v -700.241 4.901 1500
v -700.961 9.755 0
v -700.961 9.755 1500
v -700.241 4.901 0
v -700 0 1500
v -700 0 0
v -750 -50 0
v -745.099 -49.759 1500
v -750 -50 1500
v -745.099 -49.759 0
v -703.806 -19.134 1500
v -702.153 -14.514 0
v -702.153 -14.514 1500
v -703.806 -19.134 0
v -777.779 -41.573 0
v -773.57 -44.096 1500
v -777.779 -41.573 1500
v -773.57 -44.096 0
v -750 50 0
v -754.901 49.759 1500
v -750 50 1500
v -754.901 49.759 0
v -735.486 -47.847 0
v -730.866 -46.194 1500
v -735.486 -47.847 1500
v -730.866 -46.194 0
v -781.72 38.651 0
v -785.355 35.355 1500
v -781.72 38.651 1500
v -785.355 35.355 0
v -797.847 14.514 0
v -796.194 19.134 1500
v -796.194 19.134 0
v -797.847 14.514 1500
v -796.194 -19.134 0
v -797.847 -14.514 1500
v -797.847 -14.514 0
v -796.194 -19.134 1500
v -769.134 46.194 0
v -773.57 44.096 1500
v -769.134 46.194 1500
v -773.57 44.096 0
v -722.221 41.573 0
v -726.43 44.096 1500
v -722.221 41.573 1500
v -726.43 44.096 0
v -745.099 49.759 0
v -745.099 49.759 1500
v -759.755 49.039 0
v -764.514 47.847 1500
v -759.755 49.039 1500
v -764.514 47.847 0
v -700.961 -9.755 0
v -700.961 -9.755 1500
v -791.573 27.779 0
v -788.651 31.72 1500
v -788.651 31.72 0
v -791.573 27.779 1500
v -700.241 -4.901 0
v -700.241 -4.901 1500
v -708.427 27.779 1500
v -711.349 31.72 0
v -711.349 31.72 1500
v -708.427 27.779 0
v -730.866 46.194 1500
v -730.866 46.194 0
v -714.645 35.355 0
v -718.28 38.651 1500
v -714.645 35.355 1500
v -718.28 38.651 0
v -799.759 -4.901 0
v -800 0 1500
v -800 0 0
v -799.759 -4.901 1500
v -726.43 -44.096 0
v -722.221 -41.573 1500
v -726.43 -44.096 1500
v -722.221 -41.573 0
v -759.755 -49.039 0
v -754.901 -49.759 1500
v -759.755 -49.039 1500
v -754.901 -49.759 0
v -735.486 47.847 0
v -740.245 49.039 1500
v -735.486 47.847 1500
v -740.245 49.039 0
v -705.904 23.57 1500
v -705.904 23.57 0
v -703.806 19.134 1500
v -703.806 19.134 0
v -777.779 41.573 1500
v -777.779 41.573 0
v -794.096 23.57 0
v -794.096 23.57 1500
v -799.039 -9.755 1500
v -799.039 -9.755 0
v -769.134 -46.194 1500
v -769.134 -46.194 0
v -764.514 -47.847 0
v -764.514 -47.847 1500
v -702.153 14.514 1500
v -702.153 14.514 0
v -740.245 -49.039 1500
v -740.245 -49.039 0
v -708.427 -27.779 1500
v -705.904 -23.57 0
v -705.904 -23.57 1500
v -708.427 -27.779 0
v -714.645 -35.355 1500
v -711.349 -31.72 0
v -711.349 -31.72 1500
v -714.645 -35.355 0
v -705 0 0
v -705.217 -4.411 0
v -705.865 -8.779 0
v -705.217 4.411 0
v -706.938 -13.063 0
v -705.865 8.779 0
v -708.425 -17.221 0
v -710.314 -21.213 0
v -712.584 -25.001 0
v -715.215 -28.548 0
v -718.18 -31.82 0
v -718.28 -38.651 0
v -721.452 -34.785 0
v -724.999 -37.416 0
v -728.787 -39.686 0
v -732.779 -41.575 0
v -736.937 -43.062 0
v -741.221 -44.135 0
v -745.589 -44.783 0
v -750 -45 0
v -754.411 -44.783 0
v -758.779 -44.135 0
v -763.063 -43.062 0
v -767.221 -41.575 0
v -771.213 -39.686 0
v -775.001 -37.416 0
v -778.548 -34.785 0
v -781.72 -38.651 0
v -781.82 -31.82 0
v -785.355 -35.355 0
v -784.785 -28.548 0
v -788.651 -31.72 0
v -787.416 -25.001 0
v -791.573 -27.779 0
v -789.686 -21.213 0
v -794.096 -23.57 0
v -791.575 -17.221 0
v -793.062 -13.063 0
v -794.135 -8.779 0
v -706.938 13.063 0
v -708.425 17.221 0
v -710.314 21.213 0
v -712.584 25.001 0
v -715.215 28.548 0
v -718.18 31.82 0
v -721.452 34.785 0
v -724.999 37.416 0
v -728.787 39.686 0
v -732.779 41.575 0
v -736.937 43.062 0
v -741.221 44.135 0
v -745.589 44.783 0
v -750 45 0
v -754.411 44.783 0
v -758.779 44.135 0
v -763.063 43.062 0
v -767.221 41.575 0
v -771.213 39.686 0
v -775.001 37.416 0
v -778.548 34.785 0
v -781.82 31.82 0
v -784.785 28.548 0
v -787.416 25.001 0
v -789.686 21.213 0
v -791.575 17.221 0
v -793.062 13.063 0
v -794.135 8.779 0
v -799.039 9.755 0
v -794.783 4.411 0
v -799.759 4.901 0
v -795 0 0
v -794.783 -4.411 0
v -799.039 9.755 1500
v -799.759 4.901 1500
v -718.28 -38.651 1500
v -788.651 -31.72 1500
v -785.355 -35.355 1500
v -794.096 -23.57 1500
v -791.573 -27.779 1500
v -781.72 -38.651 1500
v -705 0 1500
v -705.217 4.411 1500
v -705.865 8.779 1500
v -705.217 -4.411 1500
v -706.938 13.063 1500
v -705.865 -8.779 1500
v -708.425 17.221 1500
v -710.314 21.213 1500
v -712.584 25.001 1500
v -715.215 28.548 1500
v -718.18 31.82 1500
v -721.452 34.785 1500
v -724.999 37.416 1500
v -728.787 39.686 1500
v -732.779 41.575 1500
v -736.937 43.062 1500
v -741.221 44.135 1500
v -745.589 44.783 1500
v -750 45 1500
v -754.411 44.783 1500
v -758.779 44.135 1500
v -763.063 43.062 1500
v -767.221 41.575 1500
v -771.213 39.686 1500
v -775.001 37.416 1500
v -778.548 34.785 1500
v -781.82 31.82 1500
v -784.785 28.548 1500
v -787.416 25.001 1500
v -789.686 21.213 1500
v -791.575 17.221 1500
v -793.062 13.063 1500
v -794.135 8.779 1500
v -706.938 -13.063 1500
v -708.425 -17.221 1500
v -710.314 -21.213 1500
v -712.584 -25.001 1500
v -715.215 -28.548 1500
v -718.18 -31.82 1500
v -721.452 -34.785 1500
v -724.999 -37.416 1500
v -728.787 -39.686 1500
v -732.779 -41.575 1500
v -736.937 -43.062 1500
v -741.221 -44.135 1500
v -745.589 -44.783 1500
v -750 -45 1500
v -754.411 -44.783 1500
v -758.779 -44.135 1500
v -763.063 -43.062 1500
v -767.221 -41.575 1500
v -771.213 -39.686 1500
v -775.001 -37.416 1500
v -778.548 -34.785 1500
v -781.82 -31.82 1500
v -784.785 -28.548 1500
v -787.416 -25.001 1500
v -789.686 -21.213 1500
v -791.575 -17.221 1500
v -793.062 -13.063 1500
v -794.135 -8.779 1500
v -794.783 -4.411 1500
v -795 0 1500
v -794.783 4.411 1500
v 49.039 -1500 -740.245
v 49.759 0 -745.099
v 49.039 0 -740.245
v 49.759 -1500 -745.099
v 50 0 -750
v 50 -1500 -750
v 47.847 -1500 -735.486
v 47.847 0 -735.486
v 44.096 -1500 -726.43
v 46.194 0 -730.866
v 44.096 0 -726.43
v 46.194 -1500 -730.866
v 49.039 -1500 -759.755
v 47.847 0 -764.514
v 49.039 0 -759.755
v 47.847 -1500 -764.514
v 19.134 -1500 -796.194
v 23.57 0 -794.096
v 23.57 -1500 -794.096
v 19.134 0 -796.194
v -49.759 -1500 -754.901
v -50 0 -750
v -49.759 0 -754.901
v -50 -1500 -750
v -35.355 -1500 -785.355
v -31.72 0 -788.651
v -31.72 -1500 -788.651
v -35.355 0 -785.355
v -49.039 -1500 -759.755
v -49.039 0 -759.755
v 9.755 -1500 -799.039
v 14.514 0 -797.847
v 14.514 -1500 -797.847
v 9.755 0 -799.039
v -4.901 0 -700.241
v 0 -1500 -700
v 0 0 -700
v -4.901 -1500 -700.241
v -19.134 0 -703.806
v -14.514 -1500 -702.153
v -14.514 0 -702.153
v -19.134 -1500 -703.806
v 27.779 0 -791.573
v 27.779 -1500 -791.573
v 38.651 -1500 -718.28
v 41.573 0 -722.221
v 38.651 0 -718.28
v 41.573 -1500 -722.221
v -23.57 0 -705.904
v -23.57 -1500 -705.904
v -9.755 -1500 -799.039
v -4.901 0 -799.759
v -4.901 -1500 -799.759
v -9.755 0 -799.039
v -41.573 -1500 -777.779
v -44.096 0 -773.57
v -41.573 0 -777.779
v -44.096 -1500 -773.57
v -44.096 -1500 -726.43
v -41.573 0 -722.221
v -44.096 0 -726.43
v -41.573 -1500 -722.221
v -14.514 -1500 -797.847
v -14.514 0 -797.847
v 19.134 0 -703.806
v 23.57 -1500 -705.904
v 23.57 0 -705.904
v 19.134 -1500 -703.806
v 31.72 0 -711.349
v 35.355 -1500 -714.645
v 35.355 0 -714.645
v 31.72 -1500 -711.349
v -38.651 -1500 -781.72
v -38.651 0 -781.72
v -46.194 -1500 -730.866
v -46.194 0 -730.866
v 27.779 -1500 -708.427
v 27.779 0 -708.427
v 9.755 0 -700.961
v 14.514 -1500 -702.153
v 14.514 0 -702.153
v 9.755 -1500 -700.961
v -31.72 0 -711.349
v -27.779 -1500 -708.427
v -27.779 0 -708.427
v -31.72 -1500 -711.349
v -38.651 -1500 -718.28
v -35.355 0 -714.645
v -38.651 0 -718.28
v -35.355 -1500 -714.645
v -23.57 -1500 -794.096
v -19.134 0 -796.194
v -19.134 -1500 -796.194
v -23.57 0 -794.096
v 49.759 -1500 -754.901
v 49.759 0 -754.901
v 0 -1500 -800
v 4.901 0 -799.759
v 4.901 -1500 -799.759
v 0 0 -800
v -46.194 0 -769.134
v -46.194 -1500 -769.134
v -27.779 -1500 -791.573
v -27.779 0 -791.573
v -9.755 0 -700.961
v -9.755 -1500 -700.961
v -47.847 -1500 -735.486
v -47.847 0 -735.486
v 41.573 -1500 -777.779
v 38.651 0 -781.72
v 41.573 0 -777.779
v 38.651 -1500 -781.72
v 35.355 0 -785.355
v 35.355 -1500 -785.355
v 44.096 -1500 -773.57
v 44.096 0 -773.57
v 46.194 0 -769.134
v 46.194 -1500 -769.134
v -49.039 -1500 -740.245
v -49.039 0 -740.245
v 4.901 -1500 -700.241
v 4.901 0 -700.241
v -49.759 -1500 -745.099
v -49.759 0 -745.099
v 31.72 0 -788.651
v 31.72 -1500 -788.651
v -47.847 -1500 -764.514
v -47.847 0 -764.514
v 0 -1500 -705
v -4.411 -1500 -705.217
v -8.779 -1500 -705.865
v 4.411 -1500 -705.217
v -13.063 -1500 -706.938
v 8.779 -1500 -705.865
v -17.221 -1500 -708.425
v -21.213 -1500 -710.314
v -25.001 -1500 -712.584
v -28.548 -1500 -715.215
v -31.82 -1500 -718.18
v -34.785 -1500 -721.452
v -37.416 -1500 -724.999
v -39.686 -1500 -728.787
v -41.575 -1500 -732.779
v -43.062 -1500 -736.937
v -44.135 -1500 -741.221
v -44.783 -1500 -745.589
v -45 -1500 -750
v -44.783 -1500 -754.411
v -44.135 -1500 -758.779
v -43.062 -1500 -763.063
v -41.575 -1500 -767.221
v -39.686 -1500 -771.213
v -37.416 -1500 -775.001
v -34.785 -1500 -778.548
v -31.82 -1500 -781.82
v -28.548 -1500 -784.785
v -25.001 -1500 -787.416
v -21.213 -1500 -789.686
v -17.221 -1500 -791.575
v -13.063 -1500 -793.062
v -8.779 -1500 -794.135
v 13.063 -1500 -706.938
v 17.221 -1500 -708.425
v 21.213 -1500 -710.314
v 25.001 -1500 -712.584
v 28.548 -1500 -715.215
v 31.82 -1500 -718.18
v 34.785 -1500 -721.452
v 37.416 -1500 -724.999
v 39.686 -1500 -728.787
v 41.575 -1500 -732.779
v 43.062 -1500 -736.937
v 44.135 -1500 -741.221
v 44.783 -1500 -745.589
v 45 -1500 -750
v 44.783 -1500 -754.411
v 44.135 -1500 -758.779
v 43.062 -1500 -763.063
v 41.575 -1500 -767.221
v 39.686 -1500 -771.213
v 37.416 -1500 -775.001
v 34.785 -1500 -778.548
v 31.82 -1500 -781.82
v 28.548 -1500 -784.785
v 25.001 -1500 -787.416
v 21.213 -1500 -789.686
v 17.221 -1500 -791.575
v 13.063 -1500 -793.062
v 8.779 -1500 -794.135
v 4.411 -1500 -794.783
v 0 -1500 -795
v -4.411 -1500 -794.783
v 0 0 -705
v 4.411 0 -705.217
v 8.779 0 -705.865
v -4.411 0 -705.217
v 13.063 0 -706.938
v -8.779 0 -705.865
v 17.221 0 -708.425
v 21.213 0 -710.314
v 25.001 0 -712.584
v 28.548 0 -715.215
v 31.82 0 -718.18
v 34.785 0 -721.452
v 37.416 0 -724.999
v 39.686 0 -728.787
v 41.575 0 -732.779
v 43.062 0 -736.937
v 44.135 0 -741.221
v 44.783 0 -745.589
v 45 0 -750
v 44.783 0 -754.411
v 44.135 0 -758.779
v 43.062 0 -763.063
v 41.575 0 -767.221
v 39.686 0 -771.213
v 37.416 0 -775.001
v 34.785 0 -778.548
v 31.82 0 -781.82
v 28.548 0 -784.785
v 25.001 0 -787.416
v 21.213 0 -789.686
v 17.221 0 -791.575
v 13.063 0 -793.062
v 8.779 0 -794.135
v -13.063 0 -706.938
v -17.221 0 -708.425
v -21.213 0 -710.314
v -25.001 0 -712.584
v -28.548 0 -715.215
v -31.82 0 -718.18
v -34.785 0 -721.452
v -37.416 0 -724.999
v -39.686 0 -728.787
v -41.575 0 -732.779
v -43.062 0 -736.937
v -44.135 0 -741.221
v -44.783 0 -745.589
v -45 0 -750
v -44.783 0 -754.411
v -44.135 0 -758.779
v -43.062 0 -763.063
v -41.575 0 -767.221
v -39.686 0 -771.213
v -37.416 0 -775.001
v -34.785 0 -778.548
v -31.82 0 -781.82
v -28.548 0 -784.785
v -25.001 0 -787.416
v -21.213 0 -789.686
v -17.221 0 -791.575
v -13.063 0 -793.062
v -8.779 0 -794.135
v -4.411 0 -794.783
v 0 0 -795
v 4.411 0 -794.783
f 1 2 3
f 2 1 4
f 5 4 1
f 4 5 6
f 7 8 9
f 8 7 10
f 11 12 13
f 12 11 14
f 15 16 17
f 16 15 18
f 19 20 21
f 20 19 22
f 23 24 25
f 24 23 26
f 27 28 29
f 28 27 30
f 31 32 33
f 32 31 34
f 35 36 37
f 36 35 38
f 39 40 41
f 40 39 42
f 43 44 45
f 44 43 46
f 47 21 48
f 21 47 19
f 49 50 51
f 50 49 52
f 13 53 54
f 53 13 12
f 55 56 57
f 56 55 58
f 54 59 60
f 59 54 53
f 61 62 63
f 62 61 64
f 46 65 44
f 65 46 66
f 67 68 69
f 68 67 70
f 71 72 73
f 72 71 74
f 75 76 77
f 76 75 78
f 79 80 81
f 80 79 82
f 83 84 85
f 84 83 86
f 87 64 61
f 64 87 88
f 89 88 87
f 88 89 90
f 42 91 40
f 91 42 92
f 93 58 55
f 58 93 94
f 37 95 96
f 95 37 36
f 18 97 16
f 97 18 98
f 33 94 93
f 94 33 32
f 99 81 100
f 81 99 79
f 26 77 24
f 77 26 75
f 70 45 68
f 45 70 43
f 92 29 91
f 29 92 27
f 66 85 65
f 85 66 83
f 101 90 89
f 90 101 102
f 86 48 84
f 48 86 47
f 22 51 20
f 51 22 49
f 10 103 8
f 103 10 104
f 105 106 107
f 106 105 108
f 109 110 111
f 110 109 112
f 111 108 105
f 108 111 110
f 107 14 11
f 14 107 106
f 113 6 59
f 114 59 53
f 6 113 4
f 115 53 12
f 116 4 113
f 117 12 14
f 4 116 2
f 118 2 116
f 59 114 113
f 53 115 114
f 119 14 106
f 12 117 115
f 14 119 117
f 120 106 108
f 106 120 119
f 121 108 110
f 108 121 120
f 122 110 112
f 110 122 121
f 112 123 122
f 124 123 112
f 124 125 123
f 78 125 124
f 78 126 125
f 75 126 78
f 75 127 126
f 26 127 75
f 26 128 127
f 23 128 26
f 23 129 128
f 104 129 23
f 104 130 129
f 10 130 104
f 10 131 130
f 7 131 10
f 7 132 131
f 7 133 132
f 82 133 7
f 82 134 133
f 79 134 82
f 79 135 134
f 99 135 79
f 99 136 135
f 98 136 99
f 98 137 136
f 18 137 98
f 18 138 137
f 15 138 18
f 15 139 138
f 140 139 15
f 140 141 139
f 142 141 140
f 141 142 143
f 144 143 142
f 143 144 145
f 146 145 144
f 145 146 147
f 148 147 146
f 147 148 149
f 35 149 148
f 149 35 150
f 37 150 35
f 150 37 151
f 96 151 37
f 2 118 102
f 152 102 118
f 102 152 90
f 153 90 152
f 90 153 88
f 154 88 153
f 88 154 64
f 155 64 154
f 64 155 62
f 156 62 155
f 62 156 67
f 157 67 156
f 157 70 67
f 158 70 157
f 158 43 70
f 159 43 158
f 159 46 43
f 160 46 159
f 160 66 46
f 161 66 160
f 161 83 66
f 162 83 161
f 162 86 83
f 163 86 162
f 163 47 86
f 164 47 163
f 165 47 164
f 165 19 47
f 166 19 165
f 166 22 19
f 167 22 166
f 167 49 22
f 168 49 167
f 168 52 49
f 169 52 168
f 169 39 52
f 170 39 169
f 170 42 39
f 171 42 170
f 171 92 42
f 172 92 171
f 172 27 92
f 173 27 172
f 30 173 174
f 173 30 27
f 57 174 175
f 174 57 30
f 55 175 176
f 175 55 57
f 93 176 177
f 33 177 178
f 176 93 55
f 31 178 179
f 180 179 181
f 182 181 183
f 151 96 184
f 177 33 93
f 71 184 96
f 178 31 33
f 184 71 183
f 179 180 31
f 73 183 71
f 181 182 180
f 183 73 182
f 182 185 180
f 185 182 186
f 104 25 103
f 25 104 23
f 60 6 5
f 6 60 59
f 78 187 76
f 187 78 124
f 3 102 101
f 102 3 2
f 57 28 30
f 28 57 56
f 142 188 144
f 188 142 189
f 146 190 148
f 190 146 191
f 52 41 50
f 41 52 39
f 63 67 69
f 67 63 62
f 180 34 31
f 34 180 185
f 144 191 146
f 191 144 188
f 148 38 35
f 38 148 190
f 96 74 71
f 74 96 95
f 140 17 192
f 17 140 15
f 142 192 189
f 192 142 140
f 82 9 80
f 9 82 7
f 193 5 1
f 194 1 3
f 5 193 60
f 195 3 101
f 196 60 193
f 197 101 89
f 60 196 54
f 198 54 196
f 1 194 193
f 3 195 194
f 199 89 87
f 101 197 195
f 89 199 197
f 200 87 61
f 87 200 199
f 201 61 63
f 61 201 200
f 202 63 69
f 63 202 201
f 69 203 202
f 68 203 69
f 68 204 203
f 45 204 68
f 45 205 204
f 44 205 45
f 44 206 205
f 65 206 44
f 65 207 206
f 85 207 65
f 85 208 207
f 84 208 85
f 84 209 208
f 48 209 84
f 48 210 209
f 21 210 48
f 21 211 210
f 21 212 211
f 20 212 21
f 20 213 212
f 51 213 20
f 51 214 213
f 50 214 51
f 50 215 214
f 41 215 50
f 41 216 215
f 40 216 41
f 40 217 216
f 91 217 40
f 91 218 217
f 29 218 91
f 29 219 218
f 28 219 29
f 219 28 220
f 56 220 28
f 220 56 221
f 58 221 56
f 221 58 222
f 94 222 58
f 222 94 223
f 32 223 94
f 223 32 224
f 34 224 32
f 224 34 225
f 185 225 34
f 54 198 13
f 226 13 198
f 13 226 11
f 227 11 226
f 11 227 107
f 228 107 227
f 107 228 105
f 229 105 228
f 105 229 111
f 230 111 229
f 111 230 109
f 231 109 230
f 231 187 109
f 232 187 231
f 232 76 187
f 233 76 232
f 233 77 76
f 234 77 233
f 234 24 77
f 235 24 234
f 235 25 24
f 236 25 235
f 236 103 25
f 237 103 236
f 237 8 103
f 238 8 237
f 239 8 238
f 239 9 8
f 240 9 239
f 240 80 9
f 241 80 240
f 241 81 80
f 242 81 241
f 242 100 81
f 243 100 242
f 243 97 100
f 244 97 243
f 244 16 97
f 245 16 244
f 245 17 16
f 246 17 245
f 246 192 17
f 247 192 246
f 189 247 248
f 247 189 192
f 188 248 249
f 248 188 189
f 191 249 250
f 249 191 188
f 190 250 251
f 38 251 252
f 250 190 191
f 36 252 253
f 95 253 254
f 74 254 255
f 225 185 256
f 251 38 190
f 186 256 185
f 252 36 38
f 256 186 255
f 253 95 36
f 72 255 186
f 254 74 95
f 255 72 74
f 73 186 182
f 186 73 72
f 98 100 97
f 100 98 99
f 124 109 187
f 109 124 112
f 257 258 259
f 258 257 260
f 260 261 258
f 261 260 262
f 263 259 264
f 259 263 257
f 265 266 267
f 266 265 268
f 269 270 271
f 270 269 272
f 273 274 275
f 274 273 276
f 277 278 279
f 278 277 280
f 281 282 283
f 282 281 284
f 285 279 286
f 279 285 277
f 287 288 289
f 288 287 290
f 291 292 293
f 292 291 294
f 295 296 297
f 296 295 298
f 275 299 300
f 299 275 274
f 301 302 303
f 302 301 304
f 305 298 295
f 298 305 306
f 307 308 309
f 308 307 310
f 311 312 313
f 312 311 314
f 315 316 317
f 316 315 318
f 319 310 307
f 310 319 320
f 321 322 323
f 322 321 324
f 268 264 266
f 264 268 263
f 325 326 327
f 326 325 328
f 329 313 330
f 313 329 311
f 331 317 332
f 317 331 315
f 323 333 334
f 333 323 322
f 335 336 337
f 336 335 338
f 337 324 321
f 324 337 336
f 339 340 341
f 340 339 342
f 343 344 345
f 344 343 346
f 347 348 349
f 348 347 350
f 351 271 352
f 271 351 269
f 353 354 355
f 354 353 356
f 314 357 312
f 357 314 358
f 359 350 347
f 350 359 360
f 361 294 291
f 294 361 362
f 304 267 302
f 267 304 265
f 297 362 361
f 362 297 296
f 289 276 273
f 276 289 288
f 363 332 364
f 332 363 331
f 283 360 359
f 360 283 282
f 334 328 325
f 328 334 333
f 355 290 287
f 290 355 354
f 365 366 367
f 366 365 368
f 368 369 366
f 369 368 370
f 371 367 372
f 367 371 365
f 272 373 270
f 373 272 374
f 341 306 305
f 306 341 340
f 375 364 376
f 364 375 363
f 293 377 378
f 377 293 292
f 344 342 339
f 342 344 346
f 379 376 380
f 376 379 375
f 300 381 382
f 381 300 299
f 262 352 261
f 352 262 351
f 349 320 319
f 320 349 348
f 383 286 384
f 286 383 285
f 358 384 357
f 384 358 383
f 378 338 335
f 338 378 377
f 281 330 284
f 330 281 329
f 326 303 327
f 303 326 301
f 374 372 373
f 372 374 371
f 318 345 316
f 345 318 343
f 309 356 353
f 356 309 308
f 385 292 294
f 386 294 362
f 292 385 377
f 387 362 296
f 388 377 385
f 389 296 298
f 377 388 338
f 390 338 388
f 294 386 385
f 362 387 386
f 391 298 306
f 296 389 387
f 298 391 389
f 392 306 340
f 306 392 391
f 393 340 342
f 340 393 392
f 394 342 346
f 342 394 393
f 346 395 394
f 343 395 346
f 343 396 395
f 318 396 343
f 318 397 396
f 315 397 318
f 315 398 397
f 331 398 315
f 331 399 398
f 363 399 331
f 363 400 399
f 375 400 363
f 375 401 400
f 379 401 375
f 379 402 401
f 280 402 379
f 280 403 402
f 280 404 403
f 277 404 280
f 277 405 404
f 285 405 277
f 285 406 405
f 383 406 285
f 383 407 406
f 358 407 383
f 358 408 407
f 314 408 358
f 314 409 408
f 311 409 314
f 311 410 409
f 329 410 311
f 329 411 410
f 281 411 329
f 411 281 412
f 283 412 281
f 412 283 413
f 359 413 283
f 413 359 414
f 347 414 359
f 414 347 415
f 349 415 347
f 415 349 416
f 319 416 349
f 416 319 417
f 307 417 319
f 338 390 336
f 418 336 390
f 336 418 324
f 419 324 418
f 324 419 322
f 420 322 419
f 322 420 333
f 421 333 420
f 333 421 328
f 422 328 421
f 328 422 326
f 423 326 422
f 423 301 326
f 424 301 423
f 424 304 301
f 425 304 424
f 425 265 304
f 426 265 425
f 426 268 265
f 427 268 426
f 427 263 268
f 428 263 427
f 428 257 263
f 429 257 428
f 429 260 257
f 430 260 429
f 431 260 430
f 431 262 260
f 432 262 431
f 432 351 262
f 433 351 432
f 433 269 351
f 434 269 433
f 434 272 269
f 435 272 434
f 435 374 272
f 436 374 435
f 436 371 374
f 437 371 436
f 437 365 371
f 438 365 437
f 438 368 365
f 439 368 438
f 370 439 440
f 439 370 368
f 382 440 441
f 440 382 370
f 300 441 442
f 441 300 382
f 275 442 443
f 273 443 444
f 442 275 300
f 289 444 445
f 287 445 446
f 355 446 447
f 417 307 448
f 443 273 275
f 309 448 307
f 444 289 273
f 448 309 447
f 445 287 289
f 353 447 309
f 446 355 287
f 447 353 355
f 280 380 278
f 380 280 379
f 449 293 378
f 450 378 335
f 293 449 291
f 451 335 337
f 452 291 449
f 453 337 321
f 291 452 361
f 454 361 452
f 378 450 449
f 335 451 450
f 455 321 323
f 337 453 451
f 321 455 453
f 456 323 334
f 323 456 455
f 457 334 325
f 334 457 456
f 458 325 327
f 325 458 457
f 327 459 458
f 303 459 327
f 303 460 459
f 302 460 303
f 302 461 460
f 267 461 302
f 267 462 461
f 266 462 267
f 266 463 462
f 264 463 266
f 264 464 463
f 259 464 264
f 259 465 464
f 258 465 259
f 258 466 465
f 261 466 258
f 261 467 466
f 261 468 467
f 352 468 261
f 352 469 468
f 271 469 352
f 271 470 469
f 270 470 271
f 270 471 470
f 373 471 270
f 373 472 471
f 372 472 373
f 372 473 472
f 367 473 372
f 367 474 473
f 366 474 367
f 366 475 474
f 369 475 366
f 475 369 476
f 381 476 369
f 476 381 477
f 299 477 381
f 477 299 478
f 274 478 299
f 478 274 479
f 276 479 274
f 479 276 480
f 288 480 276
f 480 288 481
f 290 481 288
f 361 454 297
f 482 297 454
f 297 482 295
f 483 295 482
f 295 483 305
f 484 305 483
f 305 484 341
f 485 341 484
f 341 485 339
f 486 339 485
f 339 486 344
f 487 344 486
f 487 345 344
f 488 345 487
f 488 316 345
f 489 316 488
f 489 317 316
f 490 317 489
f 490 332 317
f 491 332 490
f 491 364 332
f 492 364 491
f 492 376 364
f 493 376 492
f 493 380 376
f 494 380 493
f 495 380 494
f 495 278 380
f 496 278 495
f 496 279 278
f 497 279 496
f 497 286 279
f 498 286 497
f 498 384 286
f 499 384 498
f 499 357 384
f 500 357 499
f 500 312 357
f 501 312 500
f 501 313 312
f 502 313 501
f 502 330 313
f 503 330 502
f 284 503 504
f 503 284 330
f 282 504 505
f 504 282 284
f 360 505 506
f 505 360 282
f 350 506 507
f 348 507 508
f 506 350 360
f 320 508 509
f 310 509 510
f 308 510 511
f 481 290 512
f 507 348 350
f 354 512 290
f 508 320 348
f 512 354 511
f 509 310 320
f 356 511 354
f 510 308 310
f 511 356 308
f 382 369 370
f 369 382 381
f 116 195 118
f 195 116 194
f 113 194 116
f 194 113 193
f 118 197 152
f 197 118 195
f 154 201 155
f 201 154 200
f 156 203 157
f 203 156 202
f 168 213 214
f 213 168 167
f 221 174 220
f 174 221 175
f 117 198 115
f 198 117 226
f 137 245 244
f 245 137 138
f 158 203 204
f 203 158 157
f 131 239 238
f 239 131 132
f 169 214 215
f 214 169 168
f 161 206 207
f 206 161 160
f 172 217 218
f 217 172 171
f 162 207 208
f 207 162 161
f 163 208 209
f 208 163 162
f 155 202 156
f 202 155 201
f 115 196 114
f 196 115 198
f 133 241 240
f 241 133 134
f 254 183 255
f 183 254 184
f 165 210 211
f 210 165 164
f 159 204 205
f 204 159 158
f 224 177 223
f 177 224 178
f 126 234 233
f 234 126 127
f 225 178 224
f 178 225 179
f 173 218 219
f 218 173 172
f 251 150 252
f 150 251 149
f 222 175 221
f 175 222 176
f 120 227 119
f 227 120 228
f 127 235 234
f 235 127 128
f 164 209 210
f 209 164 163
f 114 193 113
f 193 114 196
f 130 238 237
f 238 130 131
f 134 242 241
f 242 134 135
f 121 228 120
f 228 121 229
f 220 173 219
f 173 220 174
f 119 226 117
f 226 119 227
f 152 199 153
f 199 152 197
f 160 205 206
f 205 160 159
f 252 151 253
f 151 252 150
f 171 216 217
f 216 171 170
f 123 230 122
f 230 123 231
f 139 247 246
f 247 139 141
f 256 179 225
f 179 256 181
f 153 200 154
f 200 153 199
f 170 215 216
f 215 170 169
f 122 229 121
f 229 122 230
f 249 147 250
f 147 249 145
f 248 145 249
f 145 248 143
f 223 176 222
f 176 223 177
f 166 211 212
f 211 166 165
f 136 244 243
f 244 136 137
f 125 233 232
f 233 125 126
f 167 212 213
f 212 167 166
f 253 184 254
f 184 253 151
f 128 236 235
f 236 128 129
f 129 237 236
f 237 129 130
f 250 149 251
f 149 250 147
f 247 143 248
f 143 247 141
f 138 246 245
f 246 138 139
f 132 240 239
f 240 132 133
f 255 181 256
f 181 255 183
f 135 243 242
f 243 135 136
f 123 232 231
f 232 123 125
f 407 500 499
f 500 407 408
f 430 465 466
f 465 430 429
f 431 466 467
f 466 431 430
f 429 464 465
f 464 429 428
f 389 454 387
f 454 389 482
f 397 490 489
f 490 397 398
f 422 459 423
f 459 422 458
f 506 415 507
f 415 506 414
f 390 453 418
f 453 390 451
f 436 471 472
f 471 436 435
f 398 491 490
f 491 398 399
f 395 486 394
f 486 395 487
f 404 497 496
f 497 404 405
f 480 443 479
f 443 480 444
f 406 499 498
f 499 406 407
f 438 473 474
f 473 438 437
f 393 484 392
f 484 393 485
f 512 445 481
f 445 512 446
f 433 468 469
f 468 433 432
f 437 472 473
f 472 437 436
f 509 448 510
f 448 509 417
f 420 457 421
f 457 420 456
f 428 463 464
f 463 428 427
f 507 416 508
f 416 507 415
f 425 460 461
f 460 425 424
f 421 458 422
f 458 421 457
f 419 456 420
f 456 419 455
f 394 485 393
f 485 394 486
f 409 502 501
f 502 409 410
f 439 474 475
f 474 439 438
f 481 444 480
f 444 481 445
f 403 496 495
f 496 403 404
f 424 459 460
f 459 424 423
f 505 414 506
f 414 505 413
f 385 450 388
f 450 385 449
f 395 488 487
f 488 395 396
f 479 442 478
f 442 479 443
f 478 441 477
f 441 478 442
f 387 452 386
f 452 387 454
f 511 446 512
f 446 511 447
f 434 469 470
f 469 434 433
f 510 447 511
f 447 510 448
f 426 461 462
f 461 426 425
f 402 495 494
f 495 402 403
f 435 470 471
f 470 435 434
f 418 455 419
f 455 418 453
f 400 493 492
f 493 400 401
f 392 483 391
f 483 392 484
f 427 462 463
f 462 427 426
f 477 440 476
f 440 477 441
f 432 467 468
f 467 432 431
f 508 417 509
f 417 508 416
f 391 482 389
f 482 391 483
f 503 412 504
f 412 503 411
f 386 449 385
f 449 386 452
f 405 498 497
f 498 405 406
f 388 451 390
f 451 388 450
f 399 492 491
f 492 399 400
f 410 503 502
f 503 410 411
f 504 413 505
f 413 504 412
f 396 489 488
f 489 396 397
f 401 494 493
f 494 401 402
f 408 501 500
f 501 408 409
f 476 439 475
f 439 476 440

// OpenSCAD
module ht_pipe() {
    difference() {
        union() {
            // Horizontal pipe
            translate([-750, 0, 0])
                cylinder(h=1500, r=50, $fn=64);
            // Vertical pipe
            translate([0, 0, -750])
                rotate([90, 0, 0])
                cylinder(h=1500, r=50, $fn=64);
        }
        // Inner horizontal pipe
        translate([-750, 0, 0])
            cylinder(h=1500, r=45, $fn=64);
        // Inner vertical pipe
        translate([0, 0, -750])
            rotate([90, 0, 0])
            cylinder(h=1500, r=45, $fn=64);
    }
}

ht_pipe();
